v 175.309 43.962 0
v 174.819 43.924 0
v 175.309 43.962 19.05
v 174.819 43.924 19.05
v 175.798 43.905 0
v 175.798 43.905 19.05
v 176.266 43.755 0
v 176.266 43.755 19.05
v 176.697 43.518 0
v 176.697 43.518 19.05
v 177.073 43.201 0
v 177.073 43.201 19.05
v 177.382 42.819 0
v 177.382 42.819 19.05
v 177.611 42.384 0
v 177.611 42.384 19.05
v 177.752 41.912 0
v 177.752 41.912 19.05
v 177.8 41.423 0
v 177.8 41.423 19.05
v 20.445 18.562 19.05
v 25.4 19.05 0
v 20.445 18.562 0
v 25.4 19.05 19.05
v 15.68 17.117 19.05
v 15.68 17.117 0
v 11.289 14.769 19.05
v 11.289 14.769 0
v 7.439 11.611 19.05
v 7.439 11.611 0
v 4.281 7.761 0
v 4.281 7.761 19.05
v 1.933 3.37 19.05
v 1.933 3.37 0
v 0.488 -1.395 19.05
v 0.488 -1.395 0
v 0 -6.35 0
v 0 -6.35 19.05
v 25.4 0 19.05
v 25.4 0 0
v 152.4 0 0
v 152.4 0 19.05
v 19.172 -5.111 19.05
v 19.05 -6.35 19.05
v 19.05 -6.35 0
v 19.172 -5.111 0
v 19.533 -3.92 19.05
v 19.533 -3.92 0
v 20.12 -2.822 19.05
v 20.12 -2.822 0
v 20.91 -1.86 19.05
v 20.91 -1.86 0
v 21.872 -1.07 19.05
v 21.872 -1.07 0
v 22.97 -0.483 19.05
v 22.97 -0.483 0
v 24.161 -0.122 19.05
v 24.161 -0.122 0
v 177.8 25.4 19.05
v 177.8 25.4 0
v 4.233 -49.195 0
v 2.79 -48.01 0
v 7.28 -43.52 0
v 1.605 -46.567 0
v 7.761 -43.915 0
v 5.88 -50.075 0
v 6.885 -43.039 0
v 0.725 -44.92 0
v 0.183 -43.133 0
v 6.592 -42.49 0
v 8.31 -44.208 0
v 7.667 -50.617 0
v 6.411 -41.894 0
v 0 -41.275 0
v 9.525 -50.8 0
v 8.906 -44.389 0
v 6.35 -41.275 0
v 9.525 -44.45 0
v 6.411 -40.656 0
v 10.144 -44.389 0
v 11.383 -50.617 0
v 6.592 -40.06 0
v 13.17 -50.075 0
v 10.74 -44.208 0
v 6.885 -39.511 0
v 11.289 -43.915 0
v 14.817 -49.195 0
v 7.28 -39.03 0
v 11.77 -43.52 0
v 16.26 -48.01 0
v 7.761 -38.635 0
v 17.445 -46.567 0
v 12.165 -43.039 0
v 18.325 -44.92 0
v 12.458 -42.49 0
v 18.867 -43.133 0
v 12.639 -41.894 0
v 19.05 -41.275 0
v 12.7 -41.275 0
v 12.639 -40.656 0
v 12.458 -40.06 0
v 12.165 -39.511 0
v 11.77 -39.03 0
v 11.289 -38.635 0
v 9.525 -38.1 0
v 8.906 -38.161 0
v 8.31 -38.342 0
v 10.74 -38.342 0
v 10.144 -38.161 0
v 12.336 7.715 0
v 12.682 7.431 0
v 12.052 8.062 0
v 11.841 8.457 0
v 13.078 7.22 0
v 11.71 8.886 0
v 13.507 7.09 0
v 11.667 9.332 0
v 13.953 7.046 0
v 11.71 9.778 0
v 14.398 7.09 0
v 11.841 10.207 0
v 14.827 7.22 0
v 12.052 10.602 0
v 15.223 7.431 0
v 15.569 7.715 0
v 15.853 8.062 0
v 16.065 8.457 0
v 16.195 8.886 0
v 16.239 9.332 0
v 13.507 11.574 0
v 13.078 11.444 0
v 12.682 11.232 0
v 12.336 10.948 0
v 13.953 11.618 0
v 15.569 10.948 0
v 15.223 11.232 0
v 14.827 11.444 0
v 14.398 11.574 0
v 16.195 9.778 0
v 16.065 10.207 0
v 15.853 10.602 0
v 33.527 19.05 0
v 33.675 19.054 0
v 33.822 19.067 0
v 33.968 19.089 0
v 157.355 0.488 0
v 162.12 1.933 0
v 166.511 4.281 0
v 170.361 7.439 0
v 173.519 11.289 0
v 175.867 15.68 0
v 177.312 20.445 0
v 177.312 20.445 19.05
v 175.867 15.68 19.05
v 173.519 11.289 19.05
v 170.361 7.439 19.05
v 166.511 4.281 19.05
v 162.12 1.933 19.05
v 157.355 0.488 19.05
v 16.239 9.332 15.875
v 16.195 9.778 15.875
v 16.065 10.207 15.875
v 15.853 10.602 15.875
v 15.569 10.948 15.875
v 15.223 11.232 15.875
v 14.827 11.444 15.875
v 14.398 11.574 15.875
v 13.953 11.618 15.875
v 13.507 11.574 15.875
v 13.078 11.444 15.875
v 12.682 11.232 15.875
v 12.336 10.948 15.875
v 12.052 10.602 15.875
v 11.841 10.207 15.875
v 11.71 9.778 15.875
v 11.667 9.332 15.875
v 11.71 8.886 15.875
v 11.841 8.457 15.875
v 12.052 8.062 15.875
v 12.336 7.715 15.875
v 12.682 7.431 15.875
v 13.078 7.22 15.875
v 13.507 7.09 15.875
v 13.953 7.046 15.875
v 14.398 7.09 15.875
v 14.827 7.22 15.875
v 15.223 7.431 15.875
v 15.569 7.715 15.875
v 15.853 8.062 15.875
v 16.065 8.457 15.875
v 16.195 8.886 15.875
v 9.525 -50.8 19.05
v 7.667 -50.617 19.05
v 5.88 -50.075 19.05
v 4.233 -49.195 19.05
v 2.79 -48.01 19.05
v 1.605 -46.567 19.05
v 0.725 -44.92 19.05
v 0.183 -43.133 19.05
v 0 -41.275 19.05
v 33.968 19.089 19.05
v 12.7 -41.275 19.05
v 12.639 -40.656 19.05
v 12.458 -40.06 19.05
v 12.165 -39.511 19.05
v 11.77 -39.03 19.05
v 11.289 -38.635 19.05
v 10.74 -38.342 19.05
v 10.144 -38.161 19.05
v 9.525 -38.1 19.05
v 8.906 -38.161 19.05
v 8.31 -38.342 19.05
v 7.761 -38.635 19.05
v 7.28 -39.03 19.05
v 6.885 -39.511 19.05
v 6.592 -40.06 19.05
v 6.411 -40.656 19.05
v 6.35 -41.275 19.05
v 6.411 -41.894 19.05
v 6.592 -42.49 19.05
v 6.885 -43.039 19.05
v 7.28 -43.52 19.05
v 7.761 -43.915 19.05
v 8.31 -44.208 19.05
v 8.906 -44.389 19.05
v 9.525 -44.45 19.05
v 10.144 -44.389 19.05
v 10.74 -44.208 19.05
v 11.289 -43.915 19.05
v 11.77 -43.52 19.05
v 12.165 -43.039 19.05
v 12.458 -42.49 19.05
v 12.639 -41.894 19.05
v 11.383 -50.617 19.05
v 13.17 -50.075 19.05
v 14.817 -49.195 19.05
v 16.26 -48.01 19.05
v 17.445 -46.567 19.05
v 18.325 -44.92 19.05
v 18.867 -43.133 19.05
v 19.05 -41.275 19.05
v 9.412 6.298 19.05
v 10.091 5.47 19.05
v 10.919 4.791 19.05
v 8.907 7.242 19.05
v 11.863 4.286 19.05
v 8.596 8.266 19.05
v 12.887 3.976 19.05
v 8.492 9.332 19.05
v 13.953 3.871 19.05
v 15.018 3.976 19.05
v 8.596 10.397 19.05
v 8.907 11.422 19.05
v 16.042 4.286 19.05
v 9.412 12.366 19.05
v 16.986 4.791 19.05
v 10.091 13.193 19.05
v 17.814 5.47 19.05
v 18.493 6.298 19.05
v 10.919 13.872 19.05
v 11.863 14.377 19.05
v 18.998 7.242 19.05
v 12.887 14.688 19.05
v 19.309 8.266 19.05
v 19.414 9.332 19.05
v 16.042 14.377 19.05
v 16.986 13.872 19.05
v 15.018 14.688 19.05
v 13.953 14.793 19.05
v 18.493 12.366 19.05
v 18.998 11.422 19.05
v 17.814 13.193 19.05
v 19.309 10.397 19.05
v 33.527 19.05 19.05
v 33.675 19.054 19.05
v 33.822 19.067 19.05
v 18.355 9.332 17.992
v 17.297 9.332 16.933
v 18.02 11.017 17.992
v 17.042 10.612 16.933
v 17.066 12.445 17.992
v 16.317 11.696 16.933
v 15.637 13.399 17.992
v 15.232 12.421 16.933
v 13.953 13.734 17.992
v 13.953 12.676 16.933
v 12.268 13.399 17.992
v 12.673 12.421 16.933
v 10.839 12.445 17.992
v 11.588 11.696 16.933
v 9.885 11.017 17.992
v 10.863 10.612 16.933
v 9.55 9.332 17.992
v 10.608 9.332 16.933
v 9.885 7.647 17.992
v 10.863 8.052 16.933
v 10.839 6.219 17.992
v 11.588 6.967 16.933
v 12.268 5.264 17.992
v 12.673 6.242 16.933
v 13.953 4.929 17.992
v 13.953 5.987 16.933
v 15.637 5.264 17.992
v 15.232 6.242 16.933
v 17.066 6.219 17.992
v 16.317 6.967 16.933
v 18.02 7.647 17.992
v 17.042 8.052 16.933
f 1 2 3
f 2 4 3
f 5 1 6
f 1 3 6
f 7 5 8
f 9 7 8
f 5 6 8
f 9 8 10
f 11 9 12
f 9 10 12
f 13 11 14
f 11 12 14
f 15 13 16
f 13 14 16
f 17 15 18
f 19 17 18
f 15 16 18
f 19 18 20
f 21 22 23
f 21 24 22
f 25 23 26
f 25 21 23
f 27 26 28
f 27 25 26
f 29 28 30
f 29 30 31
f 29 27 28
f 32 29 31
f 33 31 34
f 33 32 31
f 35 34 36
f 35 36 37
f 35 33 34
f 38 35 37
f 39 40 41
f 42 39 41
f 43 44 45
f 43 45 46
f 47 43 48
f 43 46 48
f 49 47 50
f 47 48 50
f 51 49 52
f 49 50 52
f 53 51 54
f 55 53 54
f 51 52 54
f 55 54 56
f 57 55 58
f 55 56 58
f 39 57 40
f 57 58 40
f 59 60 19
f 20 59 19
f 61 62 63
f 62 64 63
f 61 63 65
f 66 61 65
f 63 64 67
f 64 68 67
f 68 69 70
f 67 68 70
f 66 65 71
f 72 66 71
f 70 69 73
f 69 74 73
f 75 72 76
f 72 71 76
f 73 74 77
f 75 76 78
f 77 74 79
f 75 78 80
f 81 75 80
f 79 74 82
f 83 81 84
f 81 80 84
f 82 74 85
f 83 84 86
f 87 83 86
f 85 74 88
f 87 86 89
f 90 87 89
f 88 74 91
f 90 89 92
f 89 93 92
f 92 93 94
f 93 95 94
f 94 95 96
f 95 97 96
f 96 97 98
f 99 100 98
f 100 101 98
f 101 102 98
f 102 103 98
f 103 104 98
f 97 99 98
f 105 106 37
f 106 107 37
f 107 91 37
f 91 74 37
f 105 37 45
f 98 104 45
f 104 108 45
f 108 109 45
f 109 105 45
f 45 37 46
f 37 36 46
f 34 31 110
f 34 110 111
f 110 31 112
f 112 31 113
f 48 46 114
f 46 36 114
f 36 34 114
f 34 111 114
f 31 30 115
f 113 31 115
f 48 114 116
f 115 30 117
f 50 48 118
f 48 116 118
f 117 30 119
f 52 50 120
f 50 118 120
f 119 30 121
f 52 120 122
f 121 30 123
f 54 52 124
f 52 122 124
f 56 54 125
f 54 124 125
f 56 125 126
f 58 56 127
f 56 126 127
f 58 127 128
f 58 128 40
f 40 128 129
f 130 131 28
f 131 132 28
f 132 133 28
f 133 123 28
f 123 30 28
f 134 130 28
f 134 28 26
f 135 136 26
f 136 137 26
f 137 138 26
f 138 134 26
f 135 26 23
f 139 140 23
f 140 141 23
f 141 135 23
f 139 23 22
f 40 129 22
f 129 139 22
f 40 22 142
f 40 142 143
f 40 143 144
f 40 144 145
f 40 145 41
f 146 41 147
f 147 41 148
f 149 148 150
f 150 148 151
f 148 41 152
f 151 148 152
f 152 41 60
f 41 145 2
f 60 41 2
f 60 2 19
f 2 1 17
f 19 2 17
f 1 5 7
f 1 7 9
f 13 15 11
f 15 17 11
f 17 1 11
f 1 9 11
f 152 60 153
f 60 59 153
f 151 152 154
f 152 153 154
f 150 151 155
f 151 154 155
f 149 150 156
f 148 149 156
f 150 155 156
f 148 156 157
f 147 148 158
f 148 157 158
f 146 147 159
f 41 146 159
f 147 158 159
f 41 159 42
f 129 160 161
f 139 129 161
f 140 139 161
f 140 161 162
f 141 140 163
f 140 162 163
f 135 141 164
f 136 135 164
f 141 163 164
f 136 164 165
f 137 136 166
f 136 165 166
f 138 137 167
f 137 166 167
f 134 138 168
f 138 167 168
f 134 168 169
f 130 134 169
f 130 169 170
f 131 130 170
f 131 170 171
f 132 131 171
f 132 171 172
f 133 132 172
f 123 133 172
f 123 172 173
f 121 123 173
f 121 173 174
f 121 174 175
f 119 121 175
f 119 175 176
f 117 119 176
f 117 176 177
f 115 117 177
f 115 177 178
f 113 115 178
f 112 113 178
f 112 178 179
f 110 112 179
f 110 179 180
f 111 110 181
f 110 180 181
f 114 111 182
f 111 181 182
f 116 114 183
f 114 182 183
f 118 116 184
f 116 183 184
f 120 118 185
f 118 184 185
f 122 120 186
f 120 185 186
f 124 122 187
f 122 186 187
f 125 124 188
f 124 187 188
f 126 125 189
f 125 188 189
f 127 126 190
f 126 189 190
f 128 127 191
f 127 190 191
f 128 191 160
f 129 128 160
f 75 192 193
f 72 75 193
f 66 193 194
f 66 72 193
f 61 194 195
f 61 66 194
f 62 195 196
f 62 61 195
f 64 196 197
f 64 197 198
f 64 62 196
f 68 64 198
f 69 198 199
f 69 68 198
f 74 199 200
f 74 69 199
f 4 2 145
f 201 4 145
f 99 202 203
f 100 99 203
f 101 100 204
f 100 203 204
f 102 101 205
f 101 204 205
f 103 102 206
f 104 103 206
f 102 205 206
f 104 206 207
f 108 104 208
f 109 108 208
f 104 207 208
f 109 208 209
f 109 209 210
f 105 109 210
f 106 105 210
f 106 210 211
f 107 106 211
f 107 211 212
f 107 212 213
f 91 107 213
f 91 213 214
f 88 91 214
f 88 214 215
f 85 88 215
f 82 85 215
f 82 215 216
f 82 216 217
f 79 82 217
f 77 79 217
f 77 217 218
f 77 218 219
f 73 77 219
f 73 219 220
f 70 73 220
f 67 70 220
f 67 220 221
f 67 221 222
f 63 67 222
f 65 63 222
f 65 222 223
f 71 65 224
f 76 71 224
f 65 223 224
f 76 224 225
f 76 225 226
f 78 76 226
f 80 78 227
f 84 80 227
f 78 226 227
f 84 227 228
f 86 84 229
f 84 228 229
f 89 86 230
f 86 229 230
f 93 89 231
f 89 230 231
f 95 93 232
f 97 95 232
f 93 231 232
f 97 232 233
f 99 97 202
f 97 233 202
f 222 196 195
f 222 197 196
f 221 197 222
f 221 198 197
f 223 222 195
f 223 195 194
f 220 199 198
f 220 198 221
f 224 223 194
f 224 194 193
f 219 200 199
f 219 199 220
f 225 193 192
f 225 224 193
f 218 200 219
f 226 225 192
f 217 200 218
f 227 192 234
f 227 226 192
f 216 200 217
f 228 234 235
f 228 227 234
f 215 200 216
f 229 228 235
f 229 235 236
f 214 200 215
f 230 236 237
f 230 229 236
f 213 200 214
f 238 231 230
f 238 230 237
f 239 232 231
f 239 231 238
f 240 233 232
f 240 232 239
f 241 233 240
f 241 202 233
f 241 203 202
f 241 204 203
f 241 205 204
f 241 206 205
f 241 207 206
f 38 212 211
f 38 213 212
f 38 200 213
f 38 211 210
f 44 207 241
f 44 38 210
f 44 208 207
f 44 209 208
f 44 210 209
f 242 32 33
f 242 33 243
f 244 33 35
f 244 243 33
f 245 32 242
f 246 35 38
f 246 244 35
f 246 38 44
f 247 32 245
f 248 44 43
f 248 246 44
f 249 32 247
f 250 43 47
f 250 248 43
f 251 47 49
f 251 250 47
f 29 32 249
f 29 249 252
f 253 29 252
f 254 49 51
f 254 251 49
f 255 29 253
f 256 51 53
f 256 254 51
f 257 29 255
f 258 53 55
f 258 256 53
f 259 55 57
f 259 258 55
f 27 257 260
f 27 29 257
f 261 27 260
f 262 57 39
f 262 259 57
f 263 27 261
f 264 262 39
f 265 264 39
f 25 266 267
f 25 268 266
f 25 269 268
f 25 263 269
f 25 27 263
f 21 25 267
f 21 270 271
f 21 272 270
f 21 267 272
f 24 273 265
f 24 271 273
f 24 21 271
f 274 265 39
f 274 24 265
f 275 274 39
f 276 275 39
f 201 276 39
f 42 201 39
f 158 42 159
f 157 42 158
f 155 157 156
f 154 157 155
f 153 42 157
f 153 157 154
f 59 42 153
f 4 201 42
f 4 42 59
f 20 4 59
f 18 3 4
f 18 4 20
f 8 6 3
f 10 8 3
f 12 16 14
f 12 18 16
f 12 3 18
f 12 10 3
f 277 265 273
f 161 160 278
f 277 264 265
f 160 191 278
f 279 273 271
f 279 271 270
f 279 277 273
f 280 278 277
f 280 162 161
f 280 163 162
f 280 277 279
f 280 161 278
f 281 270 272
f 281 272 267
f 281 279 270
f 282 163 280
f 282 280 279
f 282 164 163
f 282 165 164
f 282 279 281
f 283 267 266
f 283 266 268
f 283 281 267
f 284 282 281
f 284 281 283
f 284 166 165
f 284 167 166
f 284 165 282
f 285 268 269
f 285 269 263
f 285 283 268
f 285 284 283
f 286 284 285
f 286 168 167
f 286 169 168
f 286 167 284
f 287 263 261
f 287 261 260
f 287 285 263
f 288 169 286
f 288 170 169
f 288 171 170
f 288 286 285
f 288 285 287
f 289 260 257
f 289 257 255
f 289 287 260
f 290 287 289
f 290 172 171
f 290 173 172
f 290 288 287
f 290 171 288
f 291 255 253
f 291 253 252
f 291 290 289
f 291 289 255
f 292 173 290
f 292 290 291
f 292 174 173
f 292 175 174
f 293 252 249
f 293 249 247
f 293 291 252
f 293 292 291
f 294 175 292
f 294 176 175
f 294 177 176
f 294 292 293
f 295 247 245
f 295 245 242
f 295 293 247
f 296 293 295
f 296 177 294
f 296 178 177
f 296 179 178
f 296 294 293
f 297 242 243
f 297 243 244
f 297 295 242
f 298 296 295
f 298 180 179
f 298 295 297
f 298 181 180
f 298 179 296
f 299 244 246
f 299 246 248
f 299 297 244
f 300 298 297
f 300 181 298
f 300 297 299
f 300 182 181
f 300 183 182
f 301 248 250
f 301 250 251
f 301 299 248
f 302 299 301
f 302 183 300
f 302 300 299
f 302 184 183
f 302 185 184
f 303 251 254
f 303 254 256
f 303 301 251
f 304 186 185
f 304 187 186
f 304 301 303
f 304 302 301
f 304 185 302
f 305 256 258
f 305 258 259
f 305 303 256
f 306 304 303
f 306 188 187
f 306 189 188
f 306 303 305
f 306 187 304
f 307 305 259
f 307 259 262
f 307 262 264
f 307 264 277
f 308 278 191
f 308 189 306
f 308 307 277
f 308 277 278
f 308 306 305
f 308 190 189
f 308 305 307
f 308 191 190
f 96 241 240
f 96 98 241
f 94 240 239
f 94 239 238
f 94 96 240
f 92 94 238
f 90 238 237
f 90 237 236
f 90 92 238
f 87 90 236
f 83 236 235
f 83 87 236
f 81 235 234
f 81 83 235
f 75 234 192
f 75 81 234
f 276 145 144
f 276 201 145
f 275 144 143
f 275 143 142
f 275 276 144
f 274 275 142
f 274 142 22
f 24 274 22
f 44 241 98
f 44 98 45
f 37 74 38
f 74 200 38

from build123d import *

# Parameters (mm, degrees)
BOSS_EXTRUDE1_DEPTH = 19.05
SKETCH4_W           = 19.05
SKETCH4_H           = 50.8
BOSS_EXTRUDE2_DEPTH = 19.05
FILLET1_R           = 2.54
SKETCH2_R           = 3.175
CUT_EXTRUDE1_DEPTH  = 186.893470837
FILLET2_R           = 25.4
FILLET3_R           = 25.4
FILLET4_R           = 6.35
FILLET5_R           = 9.525
SKETCH6_R           = 2.286
CUT_EXTRUDE3_DEPTH  = 186.893470837
CHAMFER1_SIZE       = 3.175


with BuildPart() as part:
    # Sketch1 → Boss-Extrude1 (new body)
    with BuildSketch(Plane.XY):
        Polygon((0, 0), (177.8, 0), (177.8, 44.45), (33.749441782, 19.05), (0, 19.05), align=None)
    extrude(amount=BOSS_EXTRUDE1_DEPTH)

    # Sketch4 → Boss-Extrude2 (add)
    with BuildSketch(Plane.XY.offset(19.05)):
        with Locations((9.525, -25.4)):
            Rectangle(SKETCH4_W, SKETCH4_H)
    extrude(amount=-BOSS_EXTRUDE2_DEPTH)

    # Fillet1
    fillet1_edges = [part.edges().sort_by_distance(p)[0] for p in [
        (33.749441782, 19.05, 9.525),
        (177.8, 44.45, 9.525),
    ]]
    fillet(fillet1_edges, radius=FILLET1_R)

    # Sketch2 → Cut-Extrude1 (cut, through all)
    with BuildSketch(Plane.XY.offset(19.05)):
        with Locations((9.525, -41.275)):
            Circle(SKETCH2_R)
    extrude(amount=-CUT_EXTRUDE1_DEPTH, mode=Mode.SUBTRACT)

    # Fillet2
    fillet2_edges = [part.edges().sort_by_distance(p)[0] for p in [
        (177.8, 0, 9.525),
    ]]
    fillet(fillet2_edges, radius=FILLET2_R)

    # Fillet3
    fillet3_edges = [part.edges().sort_by_distance(p)[0] for p in [
        (0, 19.05, 9.525),
    ]]
    fillet(fillet3_edges, radius=FILLET3_R)

    # Fillet4
    fillet4_edges = [part.edges().sort_by_distance(p)[0] for p in [
        (19.05, 0, 9.525),
    ]]
    fillet(fillet4_edges, radius=FILLET4_R)

    # Fillet5
    fillet5_edges = [part.edges().sort_by_distance(p)[0] for p in [
        (19.05, -50.8, 9.525),
        (0, -50.8, 9.525),
    ]]
    fillet(fillet5_edges, radius=FILLET5_R - 0.0001)  # a hair under: the kernel refuses the full size

    # Sketch6 → Cut-Extrude3 (cut, through all)
    with BuildSketch(Plane.XY.offset(19.05)):
        with Locations((13.952511732, 9.331690663)):
            Circle(SKETCH6_R)
    extrude(amount=-CUT_EXTRUDE3_DEPTH, mode=Mode.SUBTRACT)

    # Chamfer1
    chamfer1_edges = [part.edges().sort_by_distance(p)[0] for p in [
        (11.666511732, 9.331690663, 19.05),
    ]]
    chamfer(chamfer1_edges, length=CHAMFER1_SIZE)


solid = part.part
